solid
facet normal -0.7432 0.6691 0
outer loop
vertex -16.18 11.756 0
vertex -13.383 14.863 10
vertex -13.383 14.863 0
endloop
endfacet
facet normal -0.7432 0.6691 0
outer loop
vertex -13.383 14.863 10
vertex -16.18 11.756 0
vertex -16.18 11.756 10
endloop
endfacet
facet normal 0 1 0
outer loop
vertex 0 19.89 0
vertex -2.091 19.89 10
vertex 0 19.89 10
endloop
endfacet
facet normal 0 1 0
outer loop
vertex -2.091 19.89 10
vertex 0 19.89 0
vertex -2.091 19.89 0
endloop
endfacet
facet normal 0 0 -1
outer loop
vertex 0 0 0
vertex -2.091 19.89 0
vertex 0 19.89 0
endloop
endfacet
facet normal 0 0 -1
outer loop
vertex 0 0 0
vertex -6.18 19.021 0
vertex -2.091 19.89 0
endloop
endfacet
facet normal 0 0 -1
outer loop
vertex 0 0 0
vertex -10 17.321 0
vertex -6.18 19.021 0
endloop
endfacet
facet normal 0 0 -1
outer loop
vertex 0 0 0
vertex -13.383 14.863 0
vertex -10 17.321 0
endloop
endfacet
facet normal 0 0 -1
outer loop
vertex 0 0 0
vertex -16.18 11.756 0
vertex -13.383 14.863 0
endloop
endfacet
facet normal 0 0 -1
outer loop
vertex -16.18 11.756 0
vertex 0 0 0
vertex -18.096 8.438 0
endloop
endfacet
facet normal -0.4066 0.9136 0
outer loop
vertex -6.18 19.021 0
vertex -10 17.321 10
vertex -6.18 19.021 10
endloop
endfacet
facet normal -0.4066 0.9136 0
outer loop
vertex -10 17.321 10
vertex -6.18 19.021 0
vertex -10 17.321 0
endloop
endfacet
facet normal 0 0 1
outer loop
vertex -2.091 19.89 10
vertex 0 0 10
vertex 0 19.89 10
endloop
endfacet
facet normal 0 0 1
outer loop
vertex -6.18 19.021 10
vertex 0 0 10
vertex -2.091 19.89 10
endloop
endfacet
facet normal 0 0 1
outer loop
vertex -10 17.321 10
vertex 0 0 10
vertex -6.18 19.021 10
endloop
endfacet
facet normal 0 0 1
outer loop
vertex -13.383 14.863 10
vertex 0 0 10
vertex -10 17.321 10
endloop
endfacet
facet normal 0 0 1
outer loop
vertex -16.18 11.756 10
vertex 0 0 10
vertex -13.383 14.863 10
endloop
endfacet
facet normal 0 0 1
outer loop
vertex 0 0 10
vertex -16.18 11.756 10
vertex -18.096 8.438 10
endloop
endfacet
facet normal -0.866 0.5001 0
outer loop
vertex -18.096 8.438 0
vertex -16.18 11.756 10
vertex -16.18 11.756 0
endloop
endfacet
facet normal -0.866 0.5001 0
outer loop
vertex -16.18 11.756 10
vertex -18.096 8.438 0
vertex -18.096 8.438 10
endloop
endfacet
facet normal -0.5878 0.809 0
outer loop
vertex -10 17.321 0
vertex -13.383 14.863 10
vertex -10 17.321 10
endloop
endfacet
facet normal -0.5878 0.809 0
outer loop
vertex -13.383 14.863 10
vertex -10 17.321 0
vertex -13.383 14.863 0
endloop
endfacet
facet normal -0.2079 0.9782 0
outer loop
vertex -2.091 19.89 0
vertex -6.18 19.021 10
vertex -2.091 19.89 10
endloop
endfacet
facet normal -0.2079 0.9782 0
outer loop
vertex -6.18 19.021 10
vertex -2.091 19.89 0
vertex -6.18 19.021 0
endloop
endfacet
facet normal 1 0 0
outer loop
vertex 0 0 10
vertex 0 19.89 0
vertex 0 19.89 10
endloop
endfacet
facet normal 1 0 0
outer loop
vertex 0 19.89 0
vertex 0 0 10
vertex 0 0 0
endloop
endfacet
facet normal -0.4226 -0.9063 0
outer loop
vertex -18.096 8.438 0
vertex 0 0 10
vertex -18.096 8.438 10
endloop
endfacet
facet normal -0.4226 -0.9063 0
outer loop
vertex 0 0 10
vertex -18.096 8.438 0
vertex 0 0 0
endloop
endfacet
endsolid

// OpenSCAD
// file: halfCylinder.scad
// Example:
halfCylinder(
  z = 20,
  r = 10
);

module halfCylinder(
  z,
  r,
  mergeMargin = 1 // i.e. how much to overlap joined solids
) {
  difference() {
    // Cylinder itself:
    cylinder(z, r = r);
    // Cutoff part:
    translate([ 0, -r, -mergeMargin ])
    cube([ r, r * 2, z + mergeMargin * 2 ]);
  }
}
// main file
use <halfCylinder.scad>;

// Example:
pieSlice(
  z = 10,
  r = 20,
  angle = 65
);

module pieSlice(
  z,
  r,
  angle,
  mergeMargin = 1 // i.e. how much to overlap joined solids
) {
  if (angle < 180) {
    // Cut a half-cylinder out of another:
    difference() {
      halfCylinder(z, r = r);
      rotate([ 0, 0, angle ])
      translate([ 0, 0, -mergeMargin ])
      halfCylinder(z + mergeMargin * 2, r = r + mergeMargin);
    }
  } else if (angle <= 360) {
    // Combine two half-cylinders with overlap:
    halfCylinder(z, r = r);
    rotate([ 0, 0, angle - 180 ])
    halfCylinder(z, r = r);
  }
}
